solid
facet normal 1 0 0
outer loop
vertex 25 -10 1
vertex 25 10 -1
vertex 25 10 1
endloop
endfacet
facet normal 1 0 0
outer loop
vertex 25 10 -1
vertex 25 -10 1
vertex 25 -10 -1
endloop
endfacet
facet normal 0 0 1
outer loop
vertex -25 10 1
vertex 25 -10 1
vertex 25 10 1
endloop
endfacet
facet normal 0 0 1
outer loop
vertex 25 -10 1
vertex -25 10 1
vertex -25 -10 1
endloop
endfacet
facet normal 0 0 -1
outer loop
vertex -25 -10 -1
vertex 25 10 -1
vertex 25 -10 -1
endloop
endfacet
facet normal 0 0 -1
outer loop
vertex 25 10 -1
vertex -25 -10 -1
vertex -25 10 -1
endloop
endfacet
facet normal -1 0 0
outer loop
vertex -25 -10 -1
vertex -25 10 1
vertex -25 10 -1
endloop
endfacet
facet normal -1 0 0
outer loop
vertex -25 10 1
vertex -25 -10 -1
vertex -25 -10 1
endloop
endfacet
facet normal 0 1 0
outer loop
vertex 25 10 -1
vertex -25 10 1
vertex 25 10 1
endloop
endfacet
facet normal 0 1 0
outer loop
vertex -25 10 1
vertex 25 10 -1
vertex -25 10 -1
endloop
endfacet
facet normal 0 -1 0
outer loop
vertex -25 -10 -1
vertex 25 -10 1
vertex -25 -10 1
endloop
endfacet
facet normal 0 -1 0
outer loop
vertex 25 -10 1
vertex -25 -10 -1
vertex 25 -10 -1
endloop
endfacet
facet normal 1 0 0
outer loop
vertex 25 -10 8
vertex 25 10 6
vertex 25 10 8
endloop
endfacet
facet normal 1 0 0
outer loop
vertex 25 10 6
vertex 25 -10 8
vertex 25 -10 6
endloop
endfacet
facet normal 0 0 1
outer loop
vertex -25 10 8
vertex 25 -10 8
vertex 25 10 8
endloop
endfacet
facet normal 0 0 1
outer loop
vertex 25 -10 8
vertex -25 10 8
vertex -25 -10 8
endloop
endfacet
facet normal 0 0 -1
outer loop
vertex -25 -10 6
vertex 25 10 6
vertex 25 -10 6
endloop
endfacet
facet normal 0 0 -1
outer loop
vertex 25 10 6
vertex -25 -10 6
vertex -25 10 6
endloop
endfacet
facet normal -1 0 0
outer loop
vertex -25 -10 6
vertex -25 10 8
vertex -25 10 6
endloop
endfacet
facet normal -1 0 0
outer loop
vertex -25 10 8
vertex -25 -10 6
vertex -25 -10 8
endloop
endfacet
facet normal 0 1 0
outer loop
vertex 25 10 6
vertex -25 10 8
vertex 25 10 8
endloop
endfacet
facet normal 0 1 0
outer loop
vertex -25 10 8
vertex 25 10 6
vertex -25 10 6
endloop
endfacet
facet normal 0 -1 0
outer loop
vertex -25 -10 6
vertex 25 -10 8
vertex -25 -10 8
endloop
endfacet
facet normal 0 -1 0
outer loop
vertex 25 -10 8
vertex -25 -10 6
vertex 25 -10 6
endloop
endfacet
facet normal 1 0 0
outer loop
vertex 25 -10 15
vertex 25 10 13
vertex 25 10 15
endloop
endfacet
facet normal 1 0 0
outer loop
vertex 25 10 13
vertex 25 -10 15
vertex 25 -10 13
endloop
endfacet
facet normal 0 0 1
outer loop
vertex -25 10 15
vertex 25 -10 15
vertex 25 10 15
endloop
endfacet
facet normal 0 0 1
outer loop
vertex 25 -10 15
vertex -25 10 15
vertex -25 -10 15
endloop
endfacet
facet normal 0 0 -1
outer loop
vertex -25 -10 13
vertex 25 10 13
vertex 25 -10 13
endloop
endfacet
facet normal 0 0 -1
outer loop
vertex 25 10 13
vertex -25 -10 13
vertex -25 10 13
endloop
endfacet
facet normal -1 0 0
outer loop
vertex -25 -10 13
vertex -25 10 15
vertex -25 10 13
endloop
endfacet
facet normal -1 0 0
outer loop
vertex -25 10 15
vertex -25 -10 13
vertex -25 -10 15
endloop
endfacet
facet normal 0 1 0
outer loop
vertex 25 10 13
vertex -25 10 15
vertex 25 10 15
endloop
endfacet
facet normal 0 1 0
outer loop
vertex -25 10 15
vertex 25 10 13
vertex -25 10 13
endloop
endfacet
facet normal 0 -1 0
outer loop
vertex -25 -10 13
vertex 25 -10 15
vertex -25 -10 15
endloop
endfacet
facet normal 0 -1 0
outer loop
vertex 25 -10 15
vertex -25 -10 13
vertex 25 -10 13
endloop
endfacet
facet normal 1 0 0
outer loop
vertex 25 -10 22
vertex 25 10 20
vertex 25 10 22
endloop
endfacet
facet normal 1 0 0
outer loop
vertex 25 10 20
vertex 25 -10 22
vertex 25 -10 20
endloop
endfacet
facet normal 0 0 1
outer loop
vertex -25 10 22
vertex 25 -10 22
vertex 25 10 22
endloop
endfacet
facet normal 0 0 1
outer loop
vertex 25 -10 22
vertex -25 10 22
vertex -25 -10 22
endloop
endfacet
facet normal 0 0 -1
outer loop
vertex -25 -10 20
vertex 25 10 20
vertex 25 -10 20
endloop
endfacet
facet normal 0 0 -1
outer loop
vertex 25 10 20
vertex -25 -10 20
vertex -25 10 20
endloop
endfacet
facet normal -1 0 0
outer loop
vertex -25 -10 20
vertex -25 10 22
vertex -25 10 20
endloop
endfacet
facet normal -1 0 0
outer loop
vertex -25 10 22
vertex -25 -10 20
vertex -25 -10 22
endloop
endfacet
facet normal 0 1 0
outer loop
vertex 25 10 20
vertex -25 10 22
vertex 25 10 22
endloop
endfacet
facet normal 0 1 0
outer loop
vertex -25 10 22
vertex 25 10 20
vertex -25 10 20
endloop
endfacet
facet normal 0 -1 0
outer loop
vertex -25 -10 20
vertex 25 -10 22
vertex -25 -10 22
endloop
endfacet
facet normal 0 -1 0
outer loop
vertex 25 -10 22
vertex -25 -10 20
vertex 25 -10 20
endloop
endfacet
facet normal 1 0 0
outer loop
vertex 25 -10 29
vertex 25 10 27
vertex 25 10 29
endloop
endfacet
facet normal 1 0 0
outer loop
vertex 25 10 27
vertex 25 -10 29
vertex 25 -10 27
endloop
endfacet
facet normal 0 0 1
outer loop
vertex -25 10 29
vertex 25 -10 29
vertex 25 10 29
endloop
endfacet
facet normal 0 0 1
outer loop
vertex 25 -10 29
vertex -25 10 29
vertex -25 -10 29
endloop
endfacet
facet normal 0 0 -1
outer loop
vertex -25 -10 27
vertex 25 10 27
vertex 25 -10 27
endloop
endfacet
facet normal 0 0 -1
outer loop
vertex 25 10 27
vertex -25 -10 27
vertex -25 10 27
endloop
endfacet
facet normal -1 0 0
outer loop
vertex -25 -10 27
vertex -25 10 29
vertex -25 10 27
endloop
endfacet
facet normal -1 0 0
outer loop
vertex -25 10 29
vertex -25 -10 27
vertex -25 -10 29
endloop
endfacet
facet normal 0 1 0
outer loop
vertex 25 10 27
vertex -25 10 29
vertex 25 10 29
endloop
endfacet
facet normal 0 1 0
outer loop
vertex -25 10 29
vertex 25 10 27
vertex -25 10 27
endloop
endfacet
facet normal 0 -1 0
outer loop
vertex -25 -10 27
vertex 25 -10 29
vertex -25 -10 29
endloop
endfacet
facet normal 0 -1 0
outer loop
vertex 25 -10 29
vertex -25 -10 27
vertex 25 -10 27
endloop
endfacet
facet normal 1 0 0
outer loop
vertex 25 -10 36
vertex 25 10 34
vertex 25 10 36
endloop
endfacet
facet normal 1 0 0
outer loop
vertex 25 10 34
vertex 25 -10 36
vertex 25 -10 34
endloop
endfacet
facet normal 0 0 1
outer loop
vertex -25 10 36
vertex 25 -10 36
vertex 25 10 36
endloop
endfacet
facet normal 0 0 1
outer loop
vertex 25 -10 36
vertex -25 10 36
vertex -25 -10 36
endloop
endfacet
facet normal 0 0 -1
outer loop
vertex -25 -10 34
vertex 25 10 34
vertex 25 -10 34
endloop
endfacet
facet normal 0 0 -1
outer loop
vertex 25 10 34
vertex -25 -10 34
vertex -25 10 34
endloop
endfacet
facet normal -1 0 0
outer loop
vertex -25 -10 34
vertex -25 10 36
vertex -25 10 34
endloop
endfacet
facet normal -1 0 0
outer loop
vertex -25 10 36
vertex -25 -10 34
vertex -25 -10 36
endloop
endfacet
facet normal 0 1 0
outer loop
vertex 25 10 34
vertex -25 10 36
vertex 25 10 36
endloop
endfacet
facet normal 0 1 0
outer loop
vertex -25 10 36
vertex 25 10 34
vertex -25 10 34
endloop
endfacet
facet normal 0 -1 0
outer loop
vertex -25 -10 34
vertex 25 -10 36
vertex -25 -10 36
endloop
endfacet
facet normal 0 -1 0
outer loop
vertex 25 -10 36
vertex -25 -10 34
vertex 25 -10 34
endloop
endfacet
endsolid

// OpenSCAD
// Define the dimensions of the rectangular plate
module rectangular_plate(length, width, thickness) {
    cube([length, width, thickness], center = true);
}

// Parameters for the rectangular plates
plate_length = 50;  // Length of the plate
plate_width = 20;   // Width of the plate
plate_thickness = 2; // Thickness of the plate
plate_spacing = 5;   // Spacing between plates

// Generate the stack of rectangular plates
module stacked_plates() {
    for (i = [0:5]) {
        translate([0, 0, i * (plate_thickness + plate_spacing)])
            rectangular_plate(plate_length, plate_width, plate_thickness);
    }
}

// Render the stacked plates
stacked_plates();
